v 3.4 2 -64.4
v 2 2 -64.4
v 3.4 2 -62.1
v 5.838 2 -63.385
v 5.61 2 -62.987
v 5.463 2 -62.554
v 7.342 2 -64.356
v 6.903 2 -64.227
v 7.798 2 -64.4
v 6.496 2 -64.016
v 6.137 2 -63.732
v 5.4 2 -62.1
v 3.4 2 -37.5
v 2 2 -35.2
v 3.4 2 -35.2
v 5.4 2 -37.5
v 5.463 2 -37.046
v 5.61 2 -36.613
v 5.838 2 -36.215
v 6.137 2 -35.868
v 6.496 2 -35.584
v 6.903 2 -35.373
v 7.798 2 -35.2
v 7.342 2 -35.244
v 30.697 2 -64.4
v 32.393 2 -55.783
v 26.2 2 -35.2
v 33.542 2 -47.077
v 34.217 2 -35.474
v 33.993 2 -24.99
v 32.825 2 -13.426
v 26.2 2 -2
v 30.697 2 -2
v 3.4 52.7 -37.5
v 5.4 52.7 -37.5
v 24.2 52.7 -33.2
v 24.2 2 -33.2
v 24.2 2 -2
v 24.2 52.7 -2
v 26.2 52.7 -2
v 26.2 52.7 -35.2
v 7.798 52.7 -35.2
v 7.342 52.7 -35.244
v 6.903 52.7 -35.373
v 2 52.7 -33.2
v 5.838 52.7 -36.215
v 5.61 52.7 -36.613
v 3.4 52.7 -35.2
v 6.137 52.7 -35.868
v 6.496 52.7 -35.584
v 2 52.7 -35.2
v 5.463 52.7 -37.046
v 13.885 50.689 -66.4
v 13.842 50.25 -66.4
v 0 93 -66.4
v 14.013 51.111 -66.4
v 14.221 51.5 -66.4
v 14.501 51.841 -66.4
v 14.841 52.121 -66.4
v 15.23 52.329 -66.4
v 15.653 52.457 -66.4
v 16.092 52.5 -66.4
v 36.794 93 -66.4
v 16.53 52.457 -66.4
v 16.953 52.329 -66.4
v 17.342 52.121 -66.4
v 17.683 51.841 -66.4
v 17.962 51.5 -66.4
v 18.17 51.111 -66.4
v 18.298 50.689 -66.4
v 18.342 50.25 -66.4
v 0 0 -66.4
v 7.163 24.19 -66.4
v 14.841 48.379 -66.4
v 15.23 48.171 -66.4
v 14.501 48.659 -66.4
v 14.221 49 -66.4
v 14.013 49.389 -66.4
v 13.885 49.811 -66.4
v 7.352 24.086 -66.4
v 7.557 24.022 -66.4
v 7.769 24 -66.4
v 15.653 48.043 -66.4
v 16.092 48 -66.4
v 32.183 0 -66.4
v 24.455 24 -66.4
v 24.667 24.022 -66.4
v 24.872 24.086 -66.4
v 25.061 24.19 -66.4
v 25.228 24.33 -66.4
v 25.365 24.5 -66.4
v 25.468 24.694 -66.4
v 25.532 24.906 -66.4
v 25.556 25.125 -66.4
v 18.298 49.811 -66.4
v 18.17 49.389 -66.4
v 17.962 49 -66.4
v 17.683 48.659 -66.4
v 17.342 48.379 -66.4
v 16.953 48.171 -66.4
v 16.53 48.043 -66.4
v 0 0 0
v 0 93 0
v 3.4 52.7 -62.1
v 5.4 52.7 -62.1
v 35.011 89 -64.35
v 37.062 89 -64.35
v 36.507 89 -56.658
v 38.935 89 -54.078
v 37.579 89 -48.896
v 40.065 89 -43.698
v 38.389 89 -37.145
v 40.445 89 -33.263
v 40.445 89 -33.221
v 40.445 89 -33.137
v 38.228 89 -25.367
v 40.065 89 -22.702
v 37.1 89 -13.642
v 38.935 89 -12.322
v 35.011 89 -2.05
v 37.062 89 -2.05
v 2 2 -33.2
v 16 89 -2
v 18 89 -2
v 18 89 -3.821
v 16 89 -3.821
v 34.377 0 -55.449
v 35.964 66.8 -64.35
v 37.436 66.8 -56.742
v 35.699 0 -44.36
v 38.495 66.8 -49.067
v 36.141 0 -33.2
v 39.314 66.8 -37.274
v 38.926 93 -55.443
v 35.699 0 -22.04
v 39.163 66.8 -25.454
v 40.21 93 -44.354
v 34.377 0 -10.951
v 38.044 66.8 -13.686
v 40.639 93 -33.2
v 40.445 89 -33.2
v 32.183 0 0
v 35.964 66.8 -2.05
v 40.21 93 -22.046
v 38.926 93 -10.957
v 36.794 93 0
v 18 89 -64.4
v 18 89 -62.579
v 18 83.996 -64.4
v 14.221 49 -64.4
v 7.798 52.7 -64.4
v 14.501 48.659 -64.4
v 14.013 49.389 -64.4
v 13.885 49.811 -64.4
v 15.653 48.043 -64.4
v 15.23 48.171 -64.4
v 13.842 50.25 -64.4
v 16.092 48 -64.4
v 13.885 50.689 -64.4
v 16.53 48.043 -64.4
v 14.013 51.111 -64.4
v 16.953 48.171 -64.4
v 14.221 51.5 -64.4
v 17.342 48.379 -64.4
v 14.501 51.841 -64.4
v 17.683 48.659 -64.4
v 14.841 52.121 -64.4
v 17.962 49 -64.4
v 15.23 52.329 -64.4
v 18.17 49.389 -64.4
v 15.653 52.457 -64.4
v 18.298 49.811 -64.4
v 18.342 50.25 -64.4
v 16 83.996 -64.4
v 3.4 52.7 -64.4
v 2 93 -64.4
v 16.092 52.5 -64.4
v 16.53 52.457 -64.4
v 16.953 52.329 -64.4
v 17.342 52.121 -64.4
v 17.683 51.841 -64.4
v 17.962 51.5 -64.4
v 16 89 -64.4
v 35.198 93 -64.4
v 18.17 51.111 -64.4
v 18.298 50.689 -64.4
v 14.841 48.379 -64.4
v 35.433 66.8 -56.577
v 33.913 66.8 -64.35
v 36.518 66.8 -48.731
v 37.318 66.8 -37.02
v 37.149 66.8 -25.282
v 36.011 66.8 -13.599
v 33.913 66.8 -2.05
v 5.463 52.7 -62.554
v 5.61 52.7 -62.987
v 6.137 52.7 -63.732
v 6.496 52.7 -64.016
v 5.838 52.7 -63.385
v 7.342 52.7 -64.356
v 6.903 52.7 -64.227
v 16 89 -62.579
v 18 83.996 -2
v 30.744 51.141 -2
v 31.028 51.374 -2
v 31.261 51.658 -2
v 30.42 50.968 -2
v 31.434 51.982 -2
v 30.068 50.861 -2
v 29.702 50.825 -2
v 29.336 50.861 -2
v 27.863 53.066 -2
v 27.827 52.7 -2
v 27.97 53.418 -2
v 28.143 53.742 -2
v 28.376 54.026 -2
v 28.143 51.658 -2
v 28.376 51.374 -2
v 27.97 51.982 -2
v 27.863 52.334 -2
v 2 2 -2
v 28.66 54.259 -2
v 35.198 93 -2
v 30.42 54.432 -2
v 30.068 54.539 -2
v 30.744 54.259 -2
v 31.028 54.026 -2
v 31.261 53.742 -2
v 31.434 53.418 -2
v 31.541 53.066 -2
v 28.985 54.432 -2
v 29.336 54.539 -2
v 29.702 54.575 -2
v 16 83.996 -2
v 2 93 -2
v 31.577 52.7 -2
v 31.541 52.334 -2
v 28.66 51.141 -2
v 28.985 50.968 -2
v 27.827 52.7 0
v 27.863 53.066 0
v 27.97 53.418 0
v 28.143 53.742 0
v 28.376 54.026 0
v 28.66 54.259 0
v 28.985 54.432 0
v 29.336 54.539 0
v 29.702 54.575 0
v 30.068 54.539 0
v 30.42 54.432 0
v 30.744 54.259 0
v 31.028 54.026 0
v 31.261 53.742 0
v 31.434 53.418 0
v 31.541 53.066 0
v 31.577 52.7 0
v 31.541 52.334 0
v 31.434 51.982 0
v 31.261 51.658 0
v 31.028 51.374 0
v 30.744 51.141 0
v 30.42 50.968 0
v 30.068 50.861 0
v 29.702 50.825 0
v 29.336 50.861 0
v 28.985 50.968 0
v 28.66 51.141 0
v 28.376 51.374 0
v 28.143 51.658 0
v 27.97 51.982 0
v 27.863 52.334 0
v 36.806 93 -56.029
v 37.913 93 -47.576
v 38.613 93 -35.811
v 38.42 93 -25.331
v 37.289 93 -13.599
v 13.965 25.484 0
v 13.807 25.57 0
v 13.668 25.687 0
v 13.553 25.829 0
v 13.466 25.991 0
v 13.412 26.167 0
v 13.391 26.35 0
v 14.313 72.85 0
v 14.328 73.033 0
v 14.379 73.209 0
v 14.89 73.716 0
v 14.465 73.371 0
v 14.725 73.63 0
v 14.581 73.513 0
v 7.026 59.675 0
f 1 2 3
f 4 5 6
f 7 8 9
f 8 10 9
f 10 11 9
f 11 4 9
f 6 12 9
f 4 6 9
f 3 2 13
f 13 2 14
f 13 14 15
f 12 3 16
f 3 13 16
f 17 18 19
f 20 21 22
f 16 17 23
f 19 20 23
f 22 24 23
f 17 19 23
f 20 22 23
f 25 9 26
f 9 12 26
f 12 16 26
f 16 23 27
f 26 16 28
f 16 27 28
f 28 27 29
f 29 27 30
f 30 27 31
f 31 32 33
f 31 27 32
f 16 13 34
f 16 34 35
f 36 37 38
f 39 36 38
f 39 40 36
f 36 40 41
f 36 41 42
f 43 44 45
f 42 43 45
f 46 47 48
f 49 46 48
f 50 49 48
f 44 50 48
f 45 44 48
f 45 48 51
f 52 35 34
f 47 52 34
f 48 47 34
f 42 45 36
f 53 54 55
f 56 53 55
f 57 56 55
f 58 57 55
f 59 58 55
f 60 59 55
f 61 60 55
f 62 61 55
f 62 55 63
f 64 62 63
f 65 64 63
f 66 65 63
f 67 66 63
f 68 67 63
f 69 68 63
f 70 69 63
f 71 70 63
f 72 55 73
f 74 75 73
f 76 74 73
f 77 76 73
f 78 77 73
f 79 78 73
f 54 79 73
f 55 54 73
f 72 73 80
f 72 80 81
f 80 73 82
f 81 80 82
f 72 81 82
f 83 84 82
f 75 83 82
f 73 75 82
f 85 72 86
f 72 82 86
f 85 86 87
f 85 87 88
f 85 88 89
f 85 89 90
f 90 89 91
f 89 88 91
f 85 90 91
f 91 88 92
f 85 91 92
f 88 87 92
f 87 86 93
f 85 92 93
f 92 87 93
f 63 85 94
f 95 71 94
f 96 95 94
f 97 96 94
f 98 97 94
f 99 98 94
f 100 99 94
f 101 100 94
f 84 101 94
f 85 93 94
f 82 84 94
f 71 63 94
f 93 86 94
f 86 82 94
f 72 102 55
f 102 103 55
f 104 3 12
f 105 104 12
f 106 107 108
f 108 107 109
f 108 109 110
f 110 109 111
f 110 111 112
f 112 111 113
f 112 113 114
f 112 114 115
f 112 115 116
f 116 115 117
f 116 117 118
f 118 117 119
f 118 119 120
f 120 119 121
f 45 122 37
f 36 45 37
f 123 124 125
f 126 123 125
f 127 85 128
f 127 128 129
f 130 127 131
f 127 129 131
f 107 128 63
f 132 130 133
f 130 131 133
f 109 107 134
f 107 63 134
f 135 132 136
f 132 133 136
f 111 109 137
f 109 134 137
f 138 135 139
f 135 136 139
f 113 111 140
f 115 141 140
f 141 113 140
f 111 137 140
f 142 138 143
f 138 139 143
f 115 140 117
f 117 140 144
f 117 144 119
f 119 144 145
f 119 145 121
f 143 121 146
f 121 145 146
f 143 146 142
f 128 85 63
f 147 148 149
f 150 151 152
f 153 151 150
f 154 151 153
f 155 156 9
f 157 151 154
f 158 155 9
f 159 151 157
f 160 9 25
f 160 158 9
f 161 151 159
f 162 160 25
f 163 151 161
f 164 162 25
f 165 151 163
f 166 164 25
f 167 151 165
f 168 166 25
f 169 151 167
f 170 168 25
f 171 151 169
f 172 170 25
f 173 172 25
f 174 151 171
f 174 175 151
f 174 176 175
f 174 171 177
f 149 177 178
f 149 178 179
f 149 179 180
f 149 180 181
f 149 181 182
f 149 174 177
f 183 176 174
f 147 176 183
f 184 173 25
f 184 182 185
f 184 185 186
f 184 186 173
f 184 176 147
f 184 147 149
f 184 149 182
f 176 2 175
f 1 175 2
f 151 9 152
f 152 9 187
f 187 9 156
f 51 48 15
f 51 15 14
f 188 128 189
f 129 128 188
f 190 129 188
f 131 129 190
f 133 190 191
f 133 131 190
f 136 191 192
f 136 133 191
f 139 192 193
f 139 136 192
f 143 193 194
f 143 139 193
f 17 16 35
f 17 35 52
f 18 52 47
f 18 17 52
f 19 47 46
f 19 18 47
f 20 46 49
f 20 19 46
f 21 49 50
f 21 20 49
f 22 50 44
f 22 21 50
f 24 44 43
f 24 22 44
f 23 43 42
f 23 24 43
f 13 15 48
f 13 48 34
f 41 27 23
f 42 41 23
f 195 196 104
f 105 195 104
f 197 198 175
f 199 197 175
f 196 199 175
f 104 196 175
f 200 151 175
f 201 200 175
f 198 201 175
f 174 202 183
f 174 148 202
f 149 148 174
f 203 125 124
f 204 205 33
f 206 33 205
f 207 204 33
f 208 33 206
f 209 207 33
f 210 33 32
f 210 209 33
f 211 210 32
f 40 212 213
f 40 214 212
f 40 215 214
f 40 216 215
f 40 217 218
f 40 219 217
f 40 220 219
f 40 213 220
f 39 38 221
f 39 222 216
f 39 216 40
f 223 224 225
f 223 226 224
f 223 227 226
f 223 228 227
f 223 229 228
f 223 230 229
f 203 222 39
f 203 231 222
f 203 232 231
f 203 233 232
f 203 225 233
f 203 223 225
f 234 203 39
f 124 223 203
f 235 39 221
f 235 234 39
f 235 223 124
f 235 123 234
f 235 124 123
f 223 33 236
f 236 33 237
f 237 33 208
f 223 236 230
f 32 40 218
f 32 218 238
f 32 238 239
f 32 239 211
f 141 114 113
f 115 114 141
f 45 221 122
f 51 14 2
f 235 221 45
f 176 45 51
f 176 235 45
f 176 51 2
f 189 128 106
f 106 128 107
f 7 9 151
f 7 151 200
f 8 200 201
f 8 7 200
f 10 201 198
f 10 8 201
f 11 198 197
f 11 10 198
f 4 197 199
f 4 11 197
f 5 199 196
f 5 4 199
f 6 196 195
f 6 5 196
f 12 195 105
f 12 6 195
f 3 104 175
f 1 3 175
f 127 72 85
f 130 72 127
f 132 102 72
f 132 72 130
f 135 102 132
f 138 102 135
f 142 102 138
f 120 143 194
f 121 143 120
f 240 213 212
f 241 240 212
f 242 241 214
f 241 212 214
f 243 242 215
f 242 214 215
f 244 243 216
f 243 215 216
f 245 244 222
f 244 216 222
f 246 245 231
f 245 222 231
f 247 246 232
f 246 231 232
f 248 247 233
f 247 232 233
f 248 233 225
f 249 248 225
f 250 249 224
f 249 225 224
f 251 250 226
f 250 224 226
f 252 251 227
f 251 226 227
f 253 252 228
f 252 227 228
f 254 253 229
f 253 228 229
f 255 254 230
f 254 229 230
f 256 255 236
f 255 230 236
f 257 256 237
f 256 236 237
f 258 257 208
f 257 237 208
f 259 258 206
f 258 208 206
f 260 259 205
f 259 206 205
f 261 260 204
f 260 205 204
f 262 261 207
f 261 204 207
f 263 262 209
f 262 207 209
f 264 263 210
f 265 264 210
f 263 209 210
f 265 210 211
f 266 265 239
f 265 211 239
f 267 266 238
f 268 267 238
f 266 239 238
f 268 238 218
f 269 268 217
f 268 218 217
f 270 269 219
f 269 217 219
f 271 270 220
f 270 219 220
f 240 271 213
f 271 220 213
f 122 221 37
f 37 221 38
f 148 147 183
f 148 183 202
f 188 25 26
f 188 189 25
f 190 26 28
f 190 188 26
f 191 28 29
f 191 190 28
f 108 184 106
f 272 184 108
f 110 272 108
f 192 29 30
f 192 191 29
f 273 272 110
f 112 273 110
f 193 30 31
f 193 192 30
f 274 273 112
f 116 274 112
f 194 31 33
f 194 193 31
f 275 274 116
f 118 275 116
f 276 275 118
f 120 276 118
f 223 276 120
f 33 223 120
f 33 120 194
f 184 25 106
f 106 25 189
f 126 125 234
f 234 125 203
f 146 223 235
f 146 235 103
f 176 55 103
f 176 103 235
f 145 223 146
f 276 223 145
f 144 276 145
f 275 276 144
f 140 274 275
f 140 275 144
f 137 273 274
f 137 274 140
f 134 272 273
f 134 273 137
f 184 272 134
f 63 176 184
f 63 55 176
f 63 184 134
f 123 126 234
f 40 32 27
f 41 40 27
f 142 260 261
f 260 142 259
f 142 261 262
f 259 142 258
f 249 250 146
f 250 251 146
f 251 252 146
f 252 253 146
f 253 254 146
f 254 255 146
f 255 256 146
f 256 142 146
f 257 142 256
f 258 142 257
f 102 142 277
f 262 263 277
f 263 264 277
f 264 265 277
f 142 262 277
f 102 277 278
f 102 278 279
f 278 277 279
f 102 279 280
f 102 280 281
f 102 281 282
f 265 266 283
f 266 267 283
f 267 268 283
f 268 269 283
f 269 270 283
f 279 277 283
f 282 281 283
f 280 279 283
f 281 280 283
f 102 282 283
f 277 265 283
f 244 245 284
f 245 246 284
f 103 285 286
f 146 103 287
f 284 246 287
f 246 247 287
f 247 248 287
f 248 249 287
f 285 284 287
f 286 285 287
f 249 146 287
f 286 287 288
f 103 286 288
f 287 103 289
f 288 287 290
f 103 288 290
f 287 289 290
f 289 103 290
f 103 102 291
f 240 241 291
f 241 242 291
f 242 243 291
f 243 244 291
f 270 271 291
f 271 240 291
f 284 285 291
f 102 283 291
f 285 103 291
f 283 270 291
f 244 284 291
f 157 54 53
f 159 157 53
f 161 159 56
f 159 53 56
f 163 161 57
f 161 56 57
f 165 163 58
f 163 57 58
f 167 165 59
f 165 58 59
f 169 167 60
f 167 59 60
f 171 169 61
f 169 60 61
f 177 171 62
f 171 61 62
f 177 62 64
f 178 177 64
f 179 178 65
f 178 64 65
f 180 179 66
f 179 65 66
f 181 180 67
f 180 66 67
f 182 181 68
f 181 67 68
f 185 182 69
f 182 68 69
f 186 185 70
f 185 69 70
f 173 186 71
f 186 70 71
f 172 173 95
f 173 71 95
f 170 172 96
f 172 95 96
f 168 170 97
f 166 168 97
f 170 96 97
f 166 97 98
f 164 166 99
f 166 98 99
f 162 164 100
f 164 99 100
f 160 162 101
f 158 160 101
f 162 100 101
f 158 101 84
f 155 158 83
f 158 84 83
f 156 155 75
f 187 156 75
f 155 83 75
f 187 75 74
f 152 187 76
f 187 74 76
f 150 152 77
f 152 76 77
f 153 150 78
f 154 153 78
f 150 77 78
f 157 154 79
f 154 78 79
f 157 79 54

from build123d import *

# Parameters (mm, degrees)
SHELL1_T               = -2
BOSS_EXTRUDE1_START    = 2
SKETCH7_4_W            = 2
SKETCH7_4_H            = 2.3
BOSS_EXTRUDE1_DEPTH    = 50.7
FILLET1_R              = 2.4
CUT_EXTRUDE1_START     = -40.445352697
CUT_EXTRUDE1_OUTLINE_W = 62.3
CUT_EXTRUDE1_OUTLINE_H = 22.2
CUT_EXTRUDE1_DEPTH     = 6.532429258
BOSS_EXTRUDE2_DEPTH    = 1
SKETCH11_R             = 2.25
CUT_EXTRUDE2_DEPTH     = 2
SKETCH12_R             = 1.875
CUT_EXTRUDE3_DEPTH     = 2


# Read off the part's stored shape, not the designer's step: Cut-Extrude1
with BuildPart() as part:
    # Sketch7 → Loft1 section 0
    with BuildSketch(Plane(origin=(0, 0, 0), x_dir=(1, 0, 0), z_dir=(0, 1, 0))):
        with BuildLine():
            Line((0, 66.4), (32.183064352, 66.4))
            ThreePointArc((32.183064352, 66.4), (36.140979043, 33.2), (32.183064352, 0))
            Line((32.183064352, 0), (0, 0))
            Line((0, 0), (0, 66.4))
        make_face()
    # Sketch1 → Loft1 section 1
    with BuildSketch(Plane(origin=(0, 93, 0), x_dir=(1, 0, 0), z_dir=(0, 1, 0))):
        with BuildLine():
            Line((0, 66.4), (0, 0))
            Line((0, 0), (36.793809788, 0))
            ThreePointArc((36.793809788, 0), (40.63882203, 33.2), (36.793809788, 66.4))
            Line((36.793809788, 66.4), (0, 66.4))
        make_face()
    loft()

    # Shell1
    shell1_openings = [part.faces().sort_by_distance(p)[0] for p in [
        (19.698634873, 93, -33.2),
    ]]
    offset(amount=SHELL1_T, openings=shell1_openings, kind=Kind.INTERSECTION)

    # Sketch7<4> → Boss-Extrude1 (add)
    with BuildSketch(Plane(origin=(0, 0, 0), x_dir=(1, 0, 0), z_dir=(0, 1, 0)).offset(BOSS_EXTRUDE1_START)):
        Polygon((2, 35.2), (2, 33.2), (24.2, 33.2), (24.2, 2), (26.2, 2), (26.2, 35.2), (5.4, 35.2), (3.4, 35.2), align=None)
        with Locations((4.4, 36.35)):
            Rectangle(SKETCH7_4_W, SKETCH7_4_H)
        with Locations((4.4, 63.25)):
            Rectangle(SKETCH7_4_W, SKETCH7_4_H)
    extrude(amount=BOSS_EXTRUDE1_DEPTH)

    # Fillet1
    # the kernel refuses this fillet: 2.4 mm, written as the material it adds along each edge
    with BuildSketch(Plane(origin=(5.4, 2, -35.2), x_dir=(1, 0, 0), z_dir=(0, 1, 0))) as fillet1_piece_1:
        with BuildLine():
            CenterArc((2.397915762, 2.4), FILLET1_R, 182.388015463, 87.611984537)
            Line((0, 2.3), (-0.047958315, 2.298))
            ThreePointArc((-0.047958315, 2.298), (-0.048, 1.15), (-0.048, 0))
            Line((-0.048, 0), (0, -0.048))
            Line((0, -0.048), (2.397915762, -0.048))
            Line((2.397915762, -0.048), (2.397915762, 0))
        make_face()
    extrude(amount=50.7)
    with BuildSketch(Plane(origin=(5.4, 2, -64.4), x_dir=(1, 0, 0), z_dir=(0, 1, 0))) as fillet1_piece_2:
        with BuildLine():
            CenterArc((2.397915762, -2.4), FILLET1_R, 90, 87.611984537)
            Line((0, -2.3), (-0.047958315, -2.298))
            ThreePointArc((-0.047958315, -2.298), (-0.048, -1.15), (-0.048, 0))
            Line((-0.048, 0), (0, 0.048))
            Line((0, 0.048), (2.397915762, 0.048))
            Line((2.397915762, 0.048), (2.397915762, 0))
        make_face()
    extrude(amount=50.7)

    # Cut-Extrude1 outline → Cut-Extrude1 (cut)
    with BuildSketch(Plane.ZY.offset(CUT_EXTRUDE1_START)):
        with Locations((-33.2, 77.9)):
            Rectangle(CUT_EXTRUDE1_OUTLINE_W, CUT_EXTRUDE1_OUTLINE_H)
    extrude(amount=CUT_EXTRUDE1_DEPTH, mode=Mode.SUBTRACT)

    # Sketch10 → Boss-Extrude2 (add, symmetric)
    with BuildSketch(Plane(origin=(17, 0, 0), x_dir=(0, 0, -1), z_dir=(1, 0, 0))):
        Polygon((62.578627716, 89), (64.578627716, 83.505045161), (64.578627716, 89), align=None)
    boss_extrude2 = extrude(amount=BOSS_EXTRUDE2_DEPTH, both=True)

    # Sketch11 → Cut-Extrude2 (cut)
    with BuildSketch(Plane(origin=(0, 0, -66.4), x_dir=(-1, 0, 0), z_dir=(0, 0, -1))):
        with Locations((-16.091532176, 50.25)):
            Circle(SKETCH11_R)
    extrude(amount=-CUT_EXTRUDE2_DEPTH, mode=Mode.SUBTRACT)

    # Sketch12 → Cut-Extrude3 (cut)
    with BuildSketch(Plane(origin=(0, 0, -2), x_dir=(-1, 0, 0), z_dir=(0, 0, -1))):
        with Locations((-29.702128484, 52.7)):
            Circle(SKETCH12_R)
    extrude(amount=-CUT_EXTRUDE3_DEPTH, mode=Mode.SUBTRACT)

    # Mirror1: Boss-Extrude2 across plane
    add(boss_extrude2.mirror(Plane.XY.offset(-33.2)))


solid = part.part
